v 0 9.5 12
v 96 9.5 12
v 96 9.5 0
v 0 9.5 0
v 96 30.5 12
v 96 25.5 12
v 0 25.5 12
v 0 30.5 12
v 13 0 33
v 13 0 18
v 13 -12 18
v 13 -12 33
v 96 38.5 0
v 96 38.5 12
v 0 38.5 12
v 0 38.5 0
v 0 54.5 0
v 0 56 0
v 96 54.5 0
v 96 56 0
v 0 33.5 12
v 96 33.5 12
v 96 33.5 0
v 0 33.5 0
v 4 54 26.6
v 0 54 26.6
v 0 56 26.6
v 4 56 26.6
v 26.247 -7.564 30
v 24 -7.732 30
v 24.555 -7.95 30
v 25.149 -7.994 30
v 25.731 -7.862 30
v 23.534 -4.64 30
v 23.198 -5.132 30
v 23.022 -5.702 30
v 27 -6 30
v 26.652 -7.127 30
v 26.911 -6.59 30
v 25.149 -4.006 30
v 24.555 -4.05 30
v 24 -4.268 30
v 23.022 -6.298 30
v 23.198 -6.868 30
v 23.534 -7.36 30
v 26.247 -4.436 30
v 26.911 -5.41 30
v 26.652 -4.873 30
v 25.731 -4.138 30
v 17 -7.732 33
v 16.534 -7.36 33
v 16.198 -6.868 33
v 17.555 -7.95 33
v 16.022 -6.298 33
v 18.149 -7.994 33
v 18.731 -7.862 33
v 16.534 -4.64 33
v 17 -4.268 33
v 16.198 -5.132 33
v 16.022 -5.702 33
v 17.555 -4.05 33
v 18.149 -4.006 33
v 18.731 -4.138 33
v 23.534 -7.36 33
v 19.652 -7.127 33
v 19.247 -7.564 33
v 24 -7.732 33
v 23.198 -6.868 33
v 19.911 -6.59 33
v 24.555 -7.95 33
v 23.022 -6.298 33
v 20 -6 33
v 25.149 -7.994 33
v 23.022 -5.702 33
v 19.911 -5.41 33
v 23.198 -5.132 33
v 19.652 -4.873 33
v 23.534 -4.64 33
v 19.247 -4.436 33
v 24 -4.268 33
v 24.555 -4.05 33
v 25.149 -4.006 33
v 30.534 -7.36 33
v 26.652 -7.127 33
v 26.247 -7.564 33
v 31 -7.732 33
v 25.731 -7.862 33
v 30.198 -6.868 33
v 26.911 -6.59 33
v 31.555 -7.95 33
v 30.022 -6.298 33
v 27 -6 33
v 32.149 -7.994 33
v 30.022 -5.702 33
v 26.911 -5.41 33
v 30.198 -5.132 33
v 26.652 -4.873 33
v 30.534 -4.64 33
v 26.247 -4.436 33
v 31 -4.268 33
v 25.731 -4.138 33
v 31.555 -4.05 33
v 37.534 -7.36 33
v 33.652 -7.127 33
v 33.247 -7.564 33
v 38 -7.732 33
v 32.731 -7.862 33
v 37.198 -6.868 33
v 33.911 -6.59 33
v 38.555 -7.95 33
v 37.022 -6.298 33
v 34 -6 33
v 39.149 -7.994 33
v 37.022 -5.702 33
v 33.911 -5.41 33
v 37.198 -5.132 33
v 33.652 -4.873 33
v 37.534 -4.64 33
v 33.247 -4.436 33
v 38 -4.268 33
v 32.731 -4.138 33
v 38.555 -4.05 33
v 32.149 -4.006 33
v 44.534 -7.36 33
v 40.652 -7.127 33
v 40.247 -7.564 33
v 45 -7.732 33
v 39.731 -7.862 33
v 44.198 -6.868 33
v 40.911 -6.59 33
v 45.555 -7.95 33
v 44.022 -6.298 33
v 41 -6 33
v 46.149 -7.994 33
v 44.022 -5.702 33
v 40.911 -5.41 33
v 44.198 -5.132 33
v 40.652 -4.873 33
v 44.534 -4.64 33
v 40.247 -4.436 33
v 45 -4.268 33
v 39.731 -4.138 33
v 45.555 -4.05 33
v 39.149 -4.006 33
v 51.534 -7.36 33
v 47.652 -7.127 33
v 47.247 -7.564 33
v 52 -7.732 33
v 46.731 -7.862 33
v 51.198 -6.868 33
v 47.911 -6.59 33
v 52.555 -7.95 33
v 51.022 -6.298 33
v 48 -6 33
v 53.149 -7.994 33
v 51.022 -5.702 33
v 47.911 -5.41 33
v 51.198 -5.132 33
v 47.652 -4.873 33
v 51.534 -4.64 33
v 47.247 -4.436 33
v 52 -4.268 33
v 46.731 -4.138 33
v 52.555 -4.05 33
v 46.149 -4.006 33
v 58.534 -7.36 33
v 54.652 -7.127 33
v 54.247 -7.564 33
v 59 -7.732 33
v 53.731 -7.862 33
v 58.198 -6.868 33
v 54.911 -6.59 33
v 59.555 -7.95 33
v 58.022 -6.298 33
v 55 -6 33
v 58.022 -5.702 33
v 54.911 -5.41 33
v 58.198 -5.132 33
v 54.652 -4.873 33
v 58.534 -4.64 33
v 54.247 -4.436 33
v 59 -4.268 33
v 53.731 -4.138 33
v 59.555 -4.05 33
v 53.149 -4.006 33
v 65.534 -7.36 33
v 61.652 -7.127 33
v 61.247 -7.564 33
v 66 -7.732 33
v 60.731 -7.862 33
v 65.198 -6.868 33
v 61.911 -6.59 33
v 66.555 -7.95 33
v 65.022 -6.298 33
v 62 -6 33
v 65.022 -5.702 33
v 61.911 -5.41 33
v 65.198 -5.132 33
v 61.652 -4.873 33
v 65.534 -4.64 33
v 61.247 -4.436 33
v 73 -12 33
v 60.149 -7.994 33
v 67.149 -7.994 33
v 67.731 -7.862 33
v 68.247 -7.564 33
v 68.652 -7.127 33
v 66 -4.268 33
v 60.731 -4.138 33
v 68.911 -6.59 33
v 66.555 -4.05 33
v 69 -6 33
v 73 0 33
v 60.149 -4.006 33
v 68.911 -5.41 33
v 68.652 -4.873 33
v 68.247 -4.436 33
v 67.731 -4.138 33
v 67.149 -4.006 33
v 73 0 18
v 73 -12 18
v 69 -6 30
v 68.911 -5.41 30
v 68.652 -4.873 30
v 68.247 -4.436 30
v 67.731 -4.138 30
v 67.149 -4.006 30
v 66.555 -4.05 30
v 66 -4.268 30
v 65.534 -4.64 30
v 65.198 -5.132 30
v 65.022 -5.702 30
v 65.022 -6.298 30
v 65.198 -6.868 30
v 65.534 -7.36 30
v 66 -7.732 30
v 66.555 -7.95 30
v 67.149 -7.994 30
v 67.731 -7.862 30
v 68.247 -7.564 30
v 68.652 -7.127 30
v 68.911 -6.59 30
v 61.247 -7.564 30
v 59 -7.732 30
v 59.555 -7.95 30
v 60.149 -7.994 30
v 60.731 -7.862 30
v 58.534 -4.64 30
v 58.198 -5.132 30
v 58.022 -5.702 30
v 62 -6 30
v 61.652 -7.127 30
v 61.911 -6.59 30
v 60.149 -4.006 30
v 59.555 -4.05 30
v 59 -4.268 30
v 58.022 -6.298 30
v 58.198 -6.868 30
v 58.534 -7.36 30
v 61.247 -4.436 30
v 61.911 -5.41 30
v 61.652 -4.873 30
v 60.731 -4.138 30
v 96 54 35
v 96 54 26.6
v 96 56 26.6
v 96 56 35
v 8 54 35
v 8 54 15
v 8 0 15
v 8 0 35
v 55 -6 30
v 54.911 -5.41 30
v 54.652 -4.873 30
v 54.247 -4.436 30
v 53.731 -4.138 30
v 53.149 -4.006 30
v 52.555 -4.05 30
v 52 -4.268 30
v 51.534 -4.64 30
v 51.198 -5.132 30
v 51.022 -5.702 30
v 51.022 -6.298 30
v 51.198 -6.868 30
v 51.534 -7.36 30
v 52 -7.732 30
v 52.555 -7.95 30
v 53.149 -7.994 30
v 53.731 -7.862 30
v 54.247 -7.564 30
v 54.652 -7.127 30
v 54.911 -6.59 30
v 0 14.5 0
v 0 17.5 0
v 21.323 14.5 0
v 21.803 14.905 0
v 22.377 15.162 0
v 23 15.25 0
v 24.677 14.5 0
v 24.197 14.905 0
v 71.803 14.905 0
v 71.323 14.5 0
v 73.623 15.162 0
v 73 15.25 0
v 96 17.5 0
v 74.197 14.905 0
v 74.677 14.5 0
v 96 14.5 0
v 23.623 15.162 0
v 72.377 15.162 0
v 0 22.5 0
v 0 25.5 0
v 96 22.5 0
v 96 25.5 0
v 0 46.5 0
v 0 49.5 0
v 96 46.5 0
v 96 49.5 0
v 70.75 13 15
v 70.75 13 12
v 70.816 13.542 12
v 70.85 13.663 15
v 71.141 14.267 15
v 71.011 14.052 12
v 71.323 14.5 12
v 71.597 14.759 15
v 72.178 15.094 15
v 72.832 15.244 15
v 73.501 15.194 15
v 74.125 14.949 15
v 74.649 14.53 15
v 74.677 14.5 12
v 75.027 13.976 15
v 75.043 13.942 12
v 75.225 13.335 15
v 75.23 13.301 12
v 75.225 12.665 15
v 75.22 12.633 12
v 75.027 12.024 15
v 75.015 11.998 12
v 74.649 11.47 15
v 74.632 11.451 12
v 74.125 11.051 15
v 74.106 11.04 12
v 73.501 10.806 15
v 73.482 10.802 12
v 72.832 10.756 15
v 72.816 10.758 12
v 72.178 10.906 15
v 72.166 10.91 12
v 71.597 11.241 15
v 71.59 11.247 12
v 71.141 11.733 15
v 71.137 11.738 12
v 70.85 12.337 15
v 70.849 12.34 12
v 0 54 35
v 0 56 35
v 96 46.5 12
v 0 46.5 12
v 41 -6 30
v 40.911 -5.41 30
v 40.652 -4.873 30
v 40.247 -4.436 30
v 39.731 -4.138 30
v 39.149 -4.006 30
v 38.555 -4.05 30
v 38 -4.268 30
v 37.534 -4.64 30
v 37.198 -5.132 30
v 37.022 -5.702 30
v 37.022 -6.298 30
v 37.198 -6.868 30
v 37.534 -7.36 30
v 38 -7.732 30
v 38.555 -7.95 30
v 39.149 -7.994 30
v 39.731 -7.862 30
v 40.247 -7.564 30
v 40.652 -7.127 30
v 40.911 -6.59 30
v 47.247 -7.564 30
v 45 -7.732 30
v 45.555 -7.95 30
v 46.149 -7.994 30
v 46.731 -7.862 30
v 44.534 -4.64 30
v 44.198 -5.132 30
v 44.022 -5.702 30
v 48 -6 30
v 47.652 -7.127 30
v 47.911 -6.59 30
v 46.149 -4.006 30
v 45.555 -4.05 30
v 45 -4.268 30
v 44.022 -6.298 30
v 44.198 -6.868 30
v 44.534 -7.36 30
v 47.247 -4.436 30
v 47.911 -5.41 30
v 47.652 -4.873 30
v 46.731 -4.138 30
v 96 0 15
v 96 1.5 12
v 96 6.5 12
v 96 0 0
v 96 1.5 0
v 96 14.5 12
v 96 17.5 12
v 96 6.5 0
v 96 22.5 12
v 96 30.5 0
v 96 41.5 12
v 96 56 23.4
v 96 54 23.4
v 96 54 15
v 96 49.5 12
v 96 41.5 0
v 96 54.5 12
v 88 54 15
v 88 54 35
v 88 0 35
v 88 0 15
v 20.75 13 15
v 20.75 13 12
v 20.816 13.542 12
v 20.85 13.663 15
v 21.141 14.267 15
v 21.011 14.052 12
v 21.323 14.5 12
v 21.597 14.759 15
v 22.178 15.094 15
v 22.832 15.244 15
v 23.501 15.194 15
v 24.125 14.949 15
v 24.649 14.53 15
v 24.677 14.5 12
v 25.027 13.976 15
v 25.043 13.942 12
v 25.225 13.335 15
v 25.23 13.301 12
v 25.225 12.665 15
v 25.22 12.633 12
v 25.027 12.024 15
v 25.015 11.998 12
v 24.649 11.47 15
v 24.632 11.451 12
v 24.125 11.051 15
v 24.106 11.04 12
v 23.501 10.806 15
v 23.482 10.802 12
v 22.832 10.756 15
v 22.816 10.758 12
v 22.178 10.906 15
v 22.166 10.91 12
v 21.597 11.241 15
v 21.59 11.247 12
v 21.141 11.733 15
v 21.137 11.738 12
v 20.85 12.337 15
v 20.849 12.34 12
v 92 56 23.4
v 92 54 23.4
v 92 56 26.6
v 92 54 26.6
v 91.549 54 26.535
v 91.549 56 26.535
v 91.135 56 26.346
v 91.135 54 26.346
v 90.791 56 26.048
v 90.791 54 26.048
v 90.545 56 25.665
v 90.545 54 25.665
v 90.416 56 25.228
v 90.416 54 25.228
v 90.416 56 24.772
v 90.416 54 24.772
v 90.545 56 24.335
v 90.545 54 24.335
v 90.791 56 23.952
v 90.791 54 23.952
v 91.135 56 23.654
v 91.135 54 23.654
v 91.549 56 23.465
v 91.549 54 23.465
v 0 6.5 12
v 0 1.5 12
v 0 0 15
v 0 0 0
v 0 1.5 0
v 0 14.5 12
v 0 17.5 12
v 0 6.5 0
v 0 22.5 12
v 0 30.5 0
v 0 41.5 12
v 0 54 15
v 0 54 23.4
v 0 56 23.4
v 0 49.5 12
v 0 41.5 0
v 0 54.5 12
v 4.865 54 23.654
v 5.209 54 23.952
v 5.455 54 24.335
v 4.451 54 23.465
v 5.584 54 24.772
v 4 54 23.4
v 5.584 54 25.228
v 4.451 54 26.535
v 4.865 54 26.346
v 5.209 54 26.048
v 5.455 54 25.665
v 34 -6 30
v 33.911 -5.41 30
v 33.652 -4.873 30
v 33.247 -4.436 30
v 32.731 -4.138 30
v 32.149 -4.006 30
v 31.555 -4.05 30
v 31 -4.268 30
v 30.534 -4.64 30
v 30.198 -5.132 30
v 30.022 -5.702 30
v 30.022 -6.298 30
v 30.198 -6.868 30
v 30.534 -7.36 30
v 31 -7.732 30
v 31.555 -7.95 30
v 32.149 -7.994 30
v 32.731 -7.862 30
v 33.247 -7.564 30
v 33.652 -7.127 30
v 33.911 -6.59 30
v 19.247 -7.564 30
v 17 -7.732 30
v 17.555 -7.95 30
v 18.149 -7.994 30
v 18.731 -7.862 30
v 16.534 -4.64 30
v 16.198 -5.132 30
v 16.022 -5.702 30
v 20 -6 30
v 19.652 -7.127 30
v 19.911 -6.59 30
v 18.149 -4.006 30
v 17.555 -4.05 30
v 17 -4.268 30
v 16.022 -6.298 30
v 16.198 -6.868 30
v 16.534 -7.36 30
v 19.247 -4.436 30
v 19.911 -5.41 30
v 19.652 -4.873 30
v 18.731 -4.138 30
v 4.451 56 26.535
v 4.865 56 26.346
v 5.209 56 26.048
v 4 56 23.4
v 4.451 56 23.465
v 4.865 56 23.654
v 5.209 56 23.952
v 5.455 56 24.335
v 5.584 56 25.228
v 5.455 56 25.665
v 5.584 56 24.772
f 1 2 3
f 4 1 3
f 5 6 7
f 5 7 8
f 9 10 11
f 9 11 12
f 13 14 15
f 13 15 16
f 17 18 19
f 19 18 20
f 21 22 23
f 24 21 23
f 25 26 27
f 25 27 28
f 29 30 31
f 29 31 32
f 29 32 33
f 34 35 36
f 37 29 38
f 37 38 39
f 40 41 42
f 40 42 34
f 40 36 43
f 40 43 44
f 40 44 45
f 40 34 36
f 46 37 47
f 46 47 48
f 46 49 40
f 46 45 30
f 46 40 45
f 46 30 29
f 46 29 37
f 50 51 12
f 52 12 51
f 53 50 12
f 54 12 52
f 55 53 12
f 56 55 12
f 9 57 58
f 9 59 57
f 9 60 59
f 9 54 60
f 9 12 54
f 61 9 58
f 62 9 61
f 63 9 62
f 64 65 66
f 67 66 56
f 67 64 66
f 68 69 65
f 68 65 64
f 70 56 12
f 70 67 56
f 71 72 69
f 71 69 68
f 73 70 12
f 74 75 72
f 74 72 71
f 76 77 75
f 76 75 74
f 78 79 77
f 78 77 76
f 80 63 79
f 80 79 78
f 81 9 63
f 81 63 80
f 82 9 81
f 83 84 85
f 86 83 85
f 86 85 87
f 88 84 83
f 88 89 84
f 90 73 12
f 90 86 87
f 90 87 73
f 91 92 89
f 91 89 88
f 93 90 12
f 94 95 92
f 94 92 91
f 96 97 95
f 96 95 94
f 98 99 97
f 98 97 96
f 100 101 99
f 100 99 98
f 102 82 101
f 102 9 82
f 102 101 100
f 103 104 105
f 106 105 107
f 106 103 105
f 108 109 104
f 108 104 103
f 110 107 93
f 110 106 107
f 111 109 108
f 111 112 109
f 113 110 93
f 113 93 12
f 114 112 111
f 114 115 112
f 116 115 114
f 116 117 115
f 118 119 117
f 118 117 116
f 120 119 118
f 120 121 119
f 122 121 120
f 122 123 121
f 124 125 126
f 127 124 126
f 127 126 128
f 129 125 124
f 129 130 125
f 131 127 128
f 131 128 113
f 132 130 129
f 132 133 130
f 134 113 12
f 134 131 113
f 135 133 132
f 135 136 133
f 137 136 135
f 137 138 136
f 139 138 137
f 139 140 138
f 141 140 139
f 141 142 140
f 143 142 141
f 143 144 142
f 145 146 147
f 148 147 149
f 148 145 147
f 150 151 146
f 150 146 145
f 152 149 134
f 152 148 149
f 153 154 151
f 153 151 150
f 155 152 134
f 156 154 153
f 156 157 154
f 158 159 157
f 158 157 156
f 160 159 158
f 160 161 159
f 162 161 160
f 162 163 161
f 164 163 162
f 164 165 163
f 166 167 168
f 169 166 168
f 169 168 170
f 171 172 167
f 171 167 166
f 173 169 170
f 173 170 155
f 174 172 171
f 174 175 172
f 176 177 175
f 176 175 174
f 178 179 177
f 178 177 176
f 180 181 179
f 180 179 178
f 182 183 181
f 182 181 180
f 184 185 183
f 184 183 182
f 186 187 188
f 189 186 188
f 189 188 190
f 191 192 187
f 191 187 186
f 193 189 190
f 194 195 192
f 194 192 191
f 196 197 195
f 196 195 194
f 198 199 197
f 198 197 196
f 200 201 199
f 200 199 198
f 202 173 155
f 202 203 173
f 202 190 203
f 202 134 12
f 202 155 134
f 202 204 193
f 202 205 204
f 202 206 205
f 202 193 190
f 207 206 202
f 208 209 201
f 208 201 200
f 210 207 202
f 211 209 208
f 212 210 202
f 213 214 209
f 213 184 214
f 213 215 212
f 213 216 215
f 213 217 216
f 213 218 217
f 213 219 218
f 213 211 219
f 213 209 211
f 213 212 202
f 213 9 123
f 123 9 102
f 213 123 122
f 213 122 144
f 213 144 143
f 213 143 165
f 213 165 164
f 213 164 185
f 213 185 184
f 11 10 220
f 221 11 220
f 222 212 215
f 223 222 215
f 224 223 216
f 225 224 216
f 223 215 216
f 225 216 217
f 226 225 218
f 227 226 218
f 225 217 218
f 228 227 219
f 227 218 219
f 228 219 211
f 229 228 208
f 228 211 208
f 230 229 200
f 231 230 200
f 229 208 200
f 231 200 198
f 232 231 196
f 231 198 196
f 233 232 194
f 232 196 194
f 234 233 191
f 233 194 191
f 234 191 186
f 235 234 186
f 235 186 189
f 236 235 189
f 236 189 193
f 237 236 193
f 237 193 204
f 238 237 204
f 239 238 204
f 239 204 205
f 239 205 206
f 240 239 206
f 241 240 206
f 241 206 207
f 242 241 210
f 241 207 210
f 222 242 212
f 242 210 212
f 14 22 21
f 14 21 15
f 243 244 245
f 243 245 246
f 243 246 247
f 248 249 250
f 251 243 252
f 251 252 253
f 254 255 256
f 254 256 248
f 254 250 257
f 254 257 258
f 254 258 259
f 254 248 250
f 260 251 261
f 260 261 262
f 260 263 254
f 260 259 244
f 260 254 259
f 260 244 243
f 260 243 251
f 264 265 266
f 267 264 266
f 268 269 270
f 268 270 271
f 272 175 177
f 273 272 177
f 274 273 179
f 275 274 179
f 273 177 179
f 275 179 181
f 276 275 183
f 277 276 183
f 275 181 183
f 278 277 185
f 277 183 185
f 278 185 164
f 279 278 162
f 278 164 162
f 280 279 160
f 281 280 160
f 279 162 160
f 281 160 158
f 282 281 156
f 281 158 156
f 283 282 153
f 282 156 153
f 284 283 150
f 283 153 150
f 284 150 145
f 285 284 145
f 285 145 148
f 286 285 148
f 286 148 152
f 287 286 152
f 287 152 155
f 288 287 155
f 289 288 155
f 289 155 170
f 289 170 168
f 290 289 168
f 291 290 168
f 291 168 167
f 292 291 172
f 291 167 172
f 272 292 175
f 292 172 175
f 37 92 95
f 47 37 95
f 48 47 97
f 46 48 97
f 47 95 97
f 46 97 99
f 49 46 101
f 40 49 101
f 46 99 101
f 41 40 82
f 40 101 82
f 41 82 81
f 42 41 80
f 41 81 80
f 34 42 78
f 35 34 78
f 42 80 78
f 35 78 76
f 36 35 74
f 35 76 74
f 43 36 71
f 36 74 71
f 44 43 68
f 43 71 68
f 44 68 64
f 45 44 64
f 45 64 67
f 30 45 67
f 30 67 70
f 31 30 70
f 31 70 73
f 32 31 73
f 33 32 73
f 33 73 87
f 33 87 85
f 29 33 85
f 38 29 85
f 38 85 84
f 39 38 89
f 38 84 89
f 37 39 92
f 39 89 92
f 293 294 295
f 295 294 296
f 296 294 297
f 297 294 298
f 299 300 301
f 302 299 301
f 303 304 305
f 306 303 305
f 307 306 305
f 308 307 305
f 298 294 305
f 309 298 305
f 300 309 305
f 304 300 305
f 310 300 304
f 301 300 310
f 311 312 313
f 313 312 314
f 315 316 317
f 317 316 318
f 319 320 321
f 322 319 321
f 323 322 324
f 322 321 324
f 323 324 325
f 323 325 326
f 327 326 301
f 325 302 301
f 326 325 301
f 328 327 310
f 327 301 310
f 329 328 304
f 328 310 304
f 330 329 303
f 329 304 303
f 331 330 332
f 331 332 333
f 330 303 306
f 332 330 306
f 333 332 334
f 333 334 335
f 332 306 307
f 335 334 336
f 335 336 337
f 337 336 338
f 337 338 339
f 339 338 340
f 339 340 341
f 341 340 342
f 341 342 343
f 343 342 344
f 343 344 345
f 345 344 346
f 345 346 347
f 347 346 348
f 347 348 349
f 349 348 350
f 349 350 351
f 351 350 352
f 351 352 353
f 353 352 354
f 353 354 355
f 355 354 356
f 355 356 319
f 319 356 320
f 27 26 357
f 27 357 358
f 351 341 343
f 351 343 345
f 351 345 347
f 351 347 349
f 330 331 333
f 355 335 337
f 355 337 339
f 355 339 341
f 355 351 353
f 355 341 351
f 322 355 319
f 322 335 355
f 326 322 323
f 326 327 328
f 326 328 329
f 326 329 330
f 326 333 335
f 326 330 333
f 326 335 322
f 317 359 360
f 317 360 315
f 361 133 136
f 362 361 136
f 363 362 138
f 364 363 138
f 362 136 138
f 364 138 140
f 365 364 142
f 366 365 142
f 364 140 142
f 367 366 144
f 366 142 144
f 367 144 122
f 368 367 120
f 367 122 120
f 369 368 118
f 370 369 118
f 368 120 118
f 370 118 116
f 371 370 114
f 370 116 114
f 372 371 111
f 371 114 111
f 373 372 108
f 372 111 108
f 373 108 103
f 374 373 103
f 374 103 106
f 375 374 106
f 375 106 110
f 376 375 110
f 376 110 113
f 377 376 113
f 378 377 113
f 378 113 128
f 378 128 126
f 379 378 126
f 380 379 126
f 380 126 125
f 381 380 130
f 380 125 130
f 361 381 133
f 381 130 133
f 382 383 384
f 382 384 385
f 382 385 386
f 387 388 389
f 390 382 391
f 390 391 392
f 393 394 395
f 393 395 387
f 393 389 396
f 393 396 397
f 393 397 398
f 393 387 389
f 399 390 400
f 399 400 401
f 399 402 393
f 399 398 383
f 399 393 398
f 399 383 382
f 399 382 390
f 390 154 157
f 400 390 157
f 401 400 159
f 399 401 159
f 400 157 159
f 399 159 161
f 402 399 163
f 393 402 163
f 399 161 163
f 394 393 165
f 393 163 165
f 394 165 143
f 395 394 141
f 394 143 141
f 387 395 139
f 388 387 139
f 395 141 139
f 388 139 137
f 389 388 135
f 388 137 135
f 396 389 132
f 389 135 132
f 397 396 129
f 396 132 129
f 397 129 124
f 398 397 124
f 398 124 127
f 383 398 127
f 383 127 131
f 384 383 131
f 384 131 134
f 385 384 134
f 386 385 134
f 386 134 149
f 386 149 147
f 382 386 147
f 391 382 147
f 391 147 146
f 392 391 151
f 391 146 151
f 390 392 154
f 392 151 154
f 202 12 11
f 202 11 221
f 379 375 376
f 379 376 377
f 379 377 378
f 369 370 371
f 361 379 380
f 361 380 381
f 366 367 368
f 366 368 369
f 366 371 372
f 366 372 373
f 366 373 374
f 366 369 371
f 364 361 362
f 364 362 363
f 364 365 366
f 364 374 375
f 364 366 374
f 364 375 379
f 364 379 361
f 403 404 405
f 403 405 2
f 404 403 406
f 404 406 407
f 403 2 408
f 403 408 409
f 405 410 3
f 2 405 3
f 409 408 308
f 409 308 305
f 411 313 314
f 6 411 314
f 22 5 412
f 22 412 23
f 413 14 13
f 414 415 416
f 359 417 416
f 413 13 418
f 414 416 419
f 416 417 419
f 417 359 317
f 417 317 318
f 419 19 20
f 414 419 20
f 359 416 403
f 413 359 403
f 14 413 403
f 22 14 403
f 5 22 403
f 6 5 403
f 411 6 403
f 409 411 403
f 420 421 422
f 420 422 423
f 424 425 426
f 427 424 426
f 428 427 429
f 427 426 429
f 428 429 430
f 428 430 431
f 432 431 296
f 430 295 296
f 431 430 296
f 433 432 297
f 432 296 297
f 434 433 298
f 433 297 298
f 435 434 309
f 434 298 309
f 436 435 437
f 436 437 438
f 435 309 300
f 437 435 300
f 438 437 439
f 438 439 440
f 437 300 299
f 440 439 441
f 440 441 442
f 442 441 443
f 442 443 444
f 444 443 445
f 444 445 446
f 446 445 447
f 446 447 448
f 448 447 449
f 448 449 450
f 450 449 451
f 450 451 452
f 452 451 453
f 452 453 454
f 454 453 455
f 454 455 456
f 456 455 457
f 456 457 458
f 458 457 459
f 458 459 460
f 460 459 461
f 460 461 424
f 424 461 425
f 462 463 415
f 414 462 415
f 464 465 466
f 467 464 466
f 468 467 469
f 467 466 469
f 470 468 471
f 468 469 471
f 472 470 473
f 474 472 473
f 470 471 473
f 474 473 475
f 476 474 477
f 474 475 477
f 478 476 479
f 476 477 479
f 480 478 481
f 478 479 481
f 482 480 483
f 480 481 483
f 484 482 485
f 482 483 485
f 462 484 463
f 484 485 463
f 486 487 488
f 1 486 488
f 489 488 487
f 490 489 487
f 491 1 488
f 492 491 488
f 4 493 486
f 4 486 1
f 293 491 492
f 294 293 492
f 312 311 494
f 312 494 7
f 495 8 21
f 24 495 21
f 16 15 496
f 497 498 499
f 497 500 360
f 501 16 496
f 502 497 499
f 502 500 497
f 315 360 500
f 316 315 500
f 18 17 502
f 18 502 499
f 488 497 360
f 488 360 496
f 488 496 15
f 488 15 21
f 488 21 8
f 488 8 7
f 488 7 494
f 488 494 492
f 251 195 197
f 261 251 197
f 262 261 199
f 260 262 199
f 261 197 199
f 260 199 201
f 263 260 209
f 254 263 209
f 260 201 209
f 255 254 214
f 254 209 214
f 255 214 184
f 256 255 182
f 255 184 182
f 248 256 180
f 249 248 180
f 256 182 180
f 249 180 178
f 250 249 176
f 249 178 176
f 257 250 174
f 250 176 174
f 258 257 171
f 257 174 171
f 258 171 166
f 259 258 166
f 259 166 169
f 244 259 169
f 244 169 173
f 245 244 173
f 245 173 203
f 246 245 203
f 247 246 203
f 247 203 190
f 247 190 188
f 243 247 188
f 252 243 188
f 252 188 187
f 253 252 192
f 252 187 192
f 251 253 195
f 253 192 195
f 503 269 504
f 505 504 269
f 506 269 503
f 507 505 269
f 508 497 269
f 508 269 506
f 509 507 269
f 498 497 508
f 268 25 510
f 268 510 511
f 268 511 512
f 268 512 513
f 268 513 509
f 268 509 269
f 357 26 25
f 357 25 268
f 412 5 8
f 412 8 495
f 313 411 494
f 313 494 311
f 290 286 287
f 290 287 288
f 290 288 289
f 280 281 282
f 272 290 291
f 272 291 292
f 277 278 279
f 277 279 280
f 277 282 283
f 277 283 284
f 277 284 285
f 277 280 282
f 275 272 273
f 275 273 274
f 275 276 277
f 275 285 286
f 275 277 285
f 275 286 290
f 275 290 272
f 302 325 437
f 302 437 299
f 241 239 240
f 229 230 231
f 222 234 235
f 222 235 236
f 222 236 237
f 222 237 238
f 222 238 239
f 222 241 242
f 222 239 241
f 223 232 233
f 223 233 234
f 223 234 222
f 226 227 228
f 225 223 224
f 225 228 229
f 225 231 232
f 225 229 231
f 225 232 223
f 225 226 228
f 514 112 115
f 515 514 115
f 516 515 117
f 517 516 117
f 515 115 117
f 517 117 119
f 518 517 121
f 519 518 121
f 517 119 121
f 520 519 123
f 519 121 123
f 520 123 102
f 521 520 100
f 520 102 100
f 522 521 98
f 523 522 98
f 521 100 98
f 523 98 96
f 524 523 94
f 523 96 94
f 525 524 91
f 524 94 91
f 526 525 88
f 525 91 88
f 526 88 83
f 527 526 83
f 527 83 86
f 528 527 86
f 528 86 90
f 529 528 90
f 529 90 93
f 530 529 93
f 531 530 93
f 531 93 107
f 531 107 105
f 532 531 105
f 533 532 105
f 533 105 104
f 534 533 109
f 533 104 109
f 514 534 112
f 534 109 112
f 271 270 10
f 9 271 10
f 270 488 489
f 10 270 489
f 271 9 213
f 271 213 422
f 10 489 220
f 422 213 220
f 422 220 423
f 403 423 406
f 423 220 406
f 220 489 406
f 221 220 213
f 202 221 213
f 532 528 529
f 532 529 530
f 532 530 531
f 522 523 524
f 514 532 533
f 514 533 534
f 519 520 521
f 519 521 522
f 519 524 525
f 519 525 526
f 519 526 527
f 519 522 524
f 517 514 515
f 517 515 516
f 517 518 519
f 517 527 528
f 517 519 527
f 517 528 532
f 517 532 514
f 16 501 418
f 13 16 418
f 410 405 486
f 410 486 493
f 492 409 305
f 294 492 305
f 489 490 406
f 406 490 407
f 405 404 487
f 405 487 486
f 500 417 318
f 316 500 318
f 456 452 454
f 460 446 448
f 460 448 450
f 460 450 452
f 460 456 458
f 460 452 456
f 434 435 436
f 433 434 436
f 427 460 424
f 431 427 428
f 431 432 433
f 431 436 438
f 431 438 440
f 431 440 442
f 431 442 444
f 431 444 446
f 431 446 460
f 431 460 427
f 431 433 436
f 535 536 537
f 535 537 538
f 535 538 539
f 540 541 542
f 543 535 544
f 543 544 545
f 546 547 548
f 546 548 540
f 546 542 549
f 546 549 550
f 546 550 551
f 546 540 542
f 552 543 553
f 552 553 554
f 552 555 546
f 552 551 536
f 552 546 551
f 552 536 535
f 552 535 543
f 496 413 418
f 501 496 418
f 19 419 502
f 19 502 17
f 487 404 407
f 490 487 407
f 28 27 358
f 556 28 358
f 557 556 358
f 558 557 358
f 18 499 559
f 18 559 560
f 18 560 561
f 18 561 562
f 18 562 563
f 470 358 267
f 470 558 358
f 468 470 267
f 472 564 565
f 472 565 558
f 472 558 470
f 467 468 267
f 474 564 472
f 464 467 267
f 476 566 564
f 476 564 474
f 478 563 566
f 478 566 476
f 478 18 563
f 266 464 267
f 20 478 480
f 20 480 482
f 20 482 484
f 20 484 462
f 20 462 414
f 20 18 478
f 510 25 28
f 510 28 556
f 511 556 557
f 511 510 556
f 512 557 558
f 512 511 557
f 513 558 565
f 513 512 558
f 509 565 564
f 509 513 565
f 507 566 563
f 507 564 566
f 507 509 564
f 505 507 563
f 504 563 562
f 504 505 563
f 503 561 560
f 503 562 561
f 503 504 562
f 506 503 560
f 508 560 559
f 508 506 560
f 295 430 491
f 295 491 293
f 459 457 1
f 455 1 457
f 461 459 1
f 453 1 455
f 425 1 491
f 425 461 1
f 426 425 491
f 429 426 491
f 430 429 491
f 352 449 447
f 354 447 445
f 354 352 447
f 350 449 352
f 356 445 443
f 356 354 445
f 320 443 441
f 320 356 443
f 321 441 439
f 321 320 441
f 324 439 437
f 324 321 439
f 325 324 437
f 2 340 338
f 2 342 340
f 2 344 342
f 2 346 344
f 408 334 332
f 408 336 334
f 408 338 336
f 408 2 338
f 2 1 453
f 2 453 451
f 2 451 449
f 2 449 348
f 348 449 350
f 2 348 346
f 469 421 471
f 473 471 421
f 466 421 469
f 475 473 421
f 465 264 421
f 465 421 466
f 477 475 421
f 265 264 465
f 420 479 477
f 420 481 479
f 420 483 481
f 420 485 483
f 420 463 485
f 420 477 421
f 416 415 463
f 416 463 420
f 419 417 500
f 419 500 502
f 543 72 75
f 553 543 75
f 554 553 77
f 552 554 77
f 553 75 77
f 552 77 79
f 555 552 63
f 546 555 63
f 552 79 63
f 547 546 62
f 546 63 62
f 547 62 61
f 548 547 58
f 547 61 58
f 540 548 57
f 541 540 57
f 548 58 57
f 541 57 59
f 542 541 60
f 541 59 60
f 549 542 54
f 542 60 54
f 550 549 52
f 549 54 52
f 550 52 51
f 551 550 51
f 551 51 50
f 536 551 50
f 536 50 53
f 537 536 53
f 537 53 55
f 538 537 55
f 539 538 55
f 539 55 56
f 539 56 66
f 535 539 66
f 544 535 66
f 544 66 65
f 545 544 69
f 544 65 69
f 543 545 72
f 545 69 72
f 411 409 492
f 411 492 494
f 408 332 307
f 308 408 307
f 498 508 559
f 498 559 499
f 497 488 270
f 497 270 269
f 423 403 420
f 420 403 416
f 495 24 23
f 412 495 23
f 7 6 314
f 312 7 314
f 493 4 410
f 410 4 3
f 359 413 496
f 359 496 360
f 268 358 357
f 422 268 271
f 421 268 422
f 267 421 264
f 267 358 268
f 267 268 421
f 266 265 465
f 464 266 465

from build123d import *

# Parameters (mm, degrees)
SKETCH_1_W          = 96
SKETCH_1_H          = 56
EXTRUDE_1_DEPTH     = 35
SKETCH_5_W          = 20
SKETCH_5_H          = 54
CUT_EXTRUDE_3_DEPTH = 8
SKETCH_6_W          = 20
SKETCH_6_H          = 54
CUT_EXTRUDE_4_DEPTH = 8
SKETCH_7_W          = 12
SKETCH_7_H          = 5
CUT_EXTRUDE_5_DEPTH = 97
CUT_EXTRUDE_7_DEPTH = 3
SKETCH_9_W          = 60
SKETCH_9_H          = 15
EXTRUDE_2_DEPTH     = 12
SKETCH_10_R         = 2
CUT_EXTRUDE_8_DEPTH = 3
SKETCH_11_R         = 2.25
CUT_EXTRUDE_9_DEPTH = 15


with BuildPart() as part:
    # Эскиз1 → Бобышка-Вытянуть1 (new body)
    with BuildSketch(Plane.XY):
        with Locations((48, 28)):
            Rectangle(SKETCH_1_W, SKETCH_1_H)
    extrude(amount=EXTRUDE_1_DEPTH)

    # Эскиз5 → Вырез-Вытянуть3 (cut)
    with BuildSketch(Plane(origin=(96, 0, 0), x_dir=(0, 0, -1), z_dir=(1, 0, 0))):
        with Locations((-25, 27)):
            Rectangle(SKETCH_5_W, SKETCH_5_H)
    extrude(amount=-CUT_EXTRUDE_3_DEPTH, mode=Mode.SUBTRACT)

    # Эскиз6 → Вырез-Вытянуть4 (cut)
    with BuildSketch(Plane.ZY):
        with Locations((25, 27)):
            Rectangle(SKETCH_6_W, SKETCH_6_H)
    extrude(amount=-CUT_EXTRUDE_4_DEPTH, mode=Mode.SUBTRACT)

    # Эскиз7 → Вырез-Вытянуть5 (cut, through all)
    with BuildSketch(Plane(origin=(96, 0, 0), x_dir=(0, 0, -1), z_dir=(1, 0, 0))):
        with Locations((-6, 4)):
            Rectangle(SKETCH_7_W, SKETCH_7_H)
        with Locations((-6, 12)):
            Rectangle(SKETCH_7_W, SKETCH_7_H)
        with Locations((-6, 20)):
            Rectangle(SKETCH_7_W, SKETCH_7_H)
        with Locations((-6, 28)):
            Rectangle(SKETCH_7_W, SKETCH_7_H)
        with Locations((-6, 36)):
            Rectangle(SKETCH_7_W, SKETCH_7_H)
        with Locations((-6, 44)):
            Rectangle(SKETCH_7_W, SKETCH_7_H)
        with Locations((-6, 52)):
            Rectangle(SKETCH_7_W, SKETCH_7_H)
    extrude(amount=-CUT_EXTRUDE_5_DEPTH, mode=Mode.SUBTRACT)

    # Эскиз8 → Вырез-Вытянуть7 (cut, through all)
    with BuildSketch(Plane.XZ.offset(-54)):
        with BuildLine():
            ThreePointArc((4, 26.6), (5.6, 25), (4, 23.4))
            Line((4, 23.4), (0, 23.4))
            Line((0, 23.4), (0, 26.6))
            Line((0, 26.6), (4, 26.6))
        make_face()
        with BuildLine():
            Line((96, 26.6), (92, 26.6))
            ThreePointArc((92, 26.6), (90.4, 25), (92, 23.4))
            Line((92, 23.4), (96, 23.4))
            Line((96, 23.4), (96, 26.6))
        make_face()
    extrude(amount=-CUT_EXTRUDE_7_DEPTH, mode=Mode.SUBTRACT)

    # Эскиз9 → Бобышка-Вытянуть2 (add)
    with BuildSketch(Plane.XZ):
        with Locations((43, 25.5)):
            Rectangle(SKETCH_9_W, SKETCH_9_H)
    extrude(amount=EXTRUDE_2_DEPTH)

    # Эскиз10 → Вырез-Вытянуть8 (cut)
    with BuildSketch(Plane.XY.offset(33)):
        with Locations((18, -6)):
            Circle(SKETCH_10_R)
        with Locations((25, -6)):
            Circle(SKETCH_10_R)
        with Locations((32, -6)):
            Circle(SKETCH_10_R)
        with Locations((39, -6)):
            Circle(SKETCH_10_R)
        with Locations((46, -6)):
            Circle(SKETCH_10_R)
        with Locations((53, -6)):
            Circle(SKETCH_10_R)
        with Locations((60, -6)):
            Circle(SKETCH_10_R)
        with Locations((67, -6)):
            Circle(SKETCH_10_R)
    extrude(amount=-CUT_EXTRUDE_8_DEPTH, mode=Mode.SUBTRACT)

    # Эскиз11 → Вырез-Вытянуть9 (cut)
    with BuildSketch(Plane(origin=(0, 0, 0), x_dir=(-1, 0, 0), z_dir=(0, 0, -1))):
        with Locations((-23, 13)):
            Circle(SKETCH_11_R)
        with Locations((-73, 13)):
            Circle(SKETCH_11_R)
    extrude(amount=-CUT_EXTRUDE_9_DEPTH, mode=Mode.SUBTRACT)


solid = part.part
